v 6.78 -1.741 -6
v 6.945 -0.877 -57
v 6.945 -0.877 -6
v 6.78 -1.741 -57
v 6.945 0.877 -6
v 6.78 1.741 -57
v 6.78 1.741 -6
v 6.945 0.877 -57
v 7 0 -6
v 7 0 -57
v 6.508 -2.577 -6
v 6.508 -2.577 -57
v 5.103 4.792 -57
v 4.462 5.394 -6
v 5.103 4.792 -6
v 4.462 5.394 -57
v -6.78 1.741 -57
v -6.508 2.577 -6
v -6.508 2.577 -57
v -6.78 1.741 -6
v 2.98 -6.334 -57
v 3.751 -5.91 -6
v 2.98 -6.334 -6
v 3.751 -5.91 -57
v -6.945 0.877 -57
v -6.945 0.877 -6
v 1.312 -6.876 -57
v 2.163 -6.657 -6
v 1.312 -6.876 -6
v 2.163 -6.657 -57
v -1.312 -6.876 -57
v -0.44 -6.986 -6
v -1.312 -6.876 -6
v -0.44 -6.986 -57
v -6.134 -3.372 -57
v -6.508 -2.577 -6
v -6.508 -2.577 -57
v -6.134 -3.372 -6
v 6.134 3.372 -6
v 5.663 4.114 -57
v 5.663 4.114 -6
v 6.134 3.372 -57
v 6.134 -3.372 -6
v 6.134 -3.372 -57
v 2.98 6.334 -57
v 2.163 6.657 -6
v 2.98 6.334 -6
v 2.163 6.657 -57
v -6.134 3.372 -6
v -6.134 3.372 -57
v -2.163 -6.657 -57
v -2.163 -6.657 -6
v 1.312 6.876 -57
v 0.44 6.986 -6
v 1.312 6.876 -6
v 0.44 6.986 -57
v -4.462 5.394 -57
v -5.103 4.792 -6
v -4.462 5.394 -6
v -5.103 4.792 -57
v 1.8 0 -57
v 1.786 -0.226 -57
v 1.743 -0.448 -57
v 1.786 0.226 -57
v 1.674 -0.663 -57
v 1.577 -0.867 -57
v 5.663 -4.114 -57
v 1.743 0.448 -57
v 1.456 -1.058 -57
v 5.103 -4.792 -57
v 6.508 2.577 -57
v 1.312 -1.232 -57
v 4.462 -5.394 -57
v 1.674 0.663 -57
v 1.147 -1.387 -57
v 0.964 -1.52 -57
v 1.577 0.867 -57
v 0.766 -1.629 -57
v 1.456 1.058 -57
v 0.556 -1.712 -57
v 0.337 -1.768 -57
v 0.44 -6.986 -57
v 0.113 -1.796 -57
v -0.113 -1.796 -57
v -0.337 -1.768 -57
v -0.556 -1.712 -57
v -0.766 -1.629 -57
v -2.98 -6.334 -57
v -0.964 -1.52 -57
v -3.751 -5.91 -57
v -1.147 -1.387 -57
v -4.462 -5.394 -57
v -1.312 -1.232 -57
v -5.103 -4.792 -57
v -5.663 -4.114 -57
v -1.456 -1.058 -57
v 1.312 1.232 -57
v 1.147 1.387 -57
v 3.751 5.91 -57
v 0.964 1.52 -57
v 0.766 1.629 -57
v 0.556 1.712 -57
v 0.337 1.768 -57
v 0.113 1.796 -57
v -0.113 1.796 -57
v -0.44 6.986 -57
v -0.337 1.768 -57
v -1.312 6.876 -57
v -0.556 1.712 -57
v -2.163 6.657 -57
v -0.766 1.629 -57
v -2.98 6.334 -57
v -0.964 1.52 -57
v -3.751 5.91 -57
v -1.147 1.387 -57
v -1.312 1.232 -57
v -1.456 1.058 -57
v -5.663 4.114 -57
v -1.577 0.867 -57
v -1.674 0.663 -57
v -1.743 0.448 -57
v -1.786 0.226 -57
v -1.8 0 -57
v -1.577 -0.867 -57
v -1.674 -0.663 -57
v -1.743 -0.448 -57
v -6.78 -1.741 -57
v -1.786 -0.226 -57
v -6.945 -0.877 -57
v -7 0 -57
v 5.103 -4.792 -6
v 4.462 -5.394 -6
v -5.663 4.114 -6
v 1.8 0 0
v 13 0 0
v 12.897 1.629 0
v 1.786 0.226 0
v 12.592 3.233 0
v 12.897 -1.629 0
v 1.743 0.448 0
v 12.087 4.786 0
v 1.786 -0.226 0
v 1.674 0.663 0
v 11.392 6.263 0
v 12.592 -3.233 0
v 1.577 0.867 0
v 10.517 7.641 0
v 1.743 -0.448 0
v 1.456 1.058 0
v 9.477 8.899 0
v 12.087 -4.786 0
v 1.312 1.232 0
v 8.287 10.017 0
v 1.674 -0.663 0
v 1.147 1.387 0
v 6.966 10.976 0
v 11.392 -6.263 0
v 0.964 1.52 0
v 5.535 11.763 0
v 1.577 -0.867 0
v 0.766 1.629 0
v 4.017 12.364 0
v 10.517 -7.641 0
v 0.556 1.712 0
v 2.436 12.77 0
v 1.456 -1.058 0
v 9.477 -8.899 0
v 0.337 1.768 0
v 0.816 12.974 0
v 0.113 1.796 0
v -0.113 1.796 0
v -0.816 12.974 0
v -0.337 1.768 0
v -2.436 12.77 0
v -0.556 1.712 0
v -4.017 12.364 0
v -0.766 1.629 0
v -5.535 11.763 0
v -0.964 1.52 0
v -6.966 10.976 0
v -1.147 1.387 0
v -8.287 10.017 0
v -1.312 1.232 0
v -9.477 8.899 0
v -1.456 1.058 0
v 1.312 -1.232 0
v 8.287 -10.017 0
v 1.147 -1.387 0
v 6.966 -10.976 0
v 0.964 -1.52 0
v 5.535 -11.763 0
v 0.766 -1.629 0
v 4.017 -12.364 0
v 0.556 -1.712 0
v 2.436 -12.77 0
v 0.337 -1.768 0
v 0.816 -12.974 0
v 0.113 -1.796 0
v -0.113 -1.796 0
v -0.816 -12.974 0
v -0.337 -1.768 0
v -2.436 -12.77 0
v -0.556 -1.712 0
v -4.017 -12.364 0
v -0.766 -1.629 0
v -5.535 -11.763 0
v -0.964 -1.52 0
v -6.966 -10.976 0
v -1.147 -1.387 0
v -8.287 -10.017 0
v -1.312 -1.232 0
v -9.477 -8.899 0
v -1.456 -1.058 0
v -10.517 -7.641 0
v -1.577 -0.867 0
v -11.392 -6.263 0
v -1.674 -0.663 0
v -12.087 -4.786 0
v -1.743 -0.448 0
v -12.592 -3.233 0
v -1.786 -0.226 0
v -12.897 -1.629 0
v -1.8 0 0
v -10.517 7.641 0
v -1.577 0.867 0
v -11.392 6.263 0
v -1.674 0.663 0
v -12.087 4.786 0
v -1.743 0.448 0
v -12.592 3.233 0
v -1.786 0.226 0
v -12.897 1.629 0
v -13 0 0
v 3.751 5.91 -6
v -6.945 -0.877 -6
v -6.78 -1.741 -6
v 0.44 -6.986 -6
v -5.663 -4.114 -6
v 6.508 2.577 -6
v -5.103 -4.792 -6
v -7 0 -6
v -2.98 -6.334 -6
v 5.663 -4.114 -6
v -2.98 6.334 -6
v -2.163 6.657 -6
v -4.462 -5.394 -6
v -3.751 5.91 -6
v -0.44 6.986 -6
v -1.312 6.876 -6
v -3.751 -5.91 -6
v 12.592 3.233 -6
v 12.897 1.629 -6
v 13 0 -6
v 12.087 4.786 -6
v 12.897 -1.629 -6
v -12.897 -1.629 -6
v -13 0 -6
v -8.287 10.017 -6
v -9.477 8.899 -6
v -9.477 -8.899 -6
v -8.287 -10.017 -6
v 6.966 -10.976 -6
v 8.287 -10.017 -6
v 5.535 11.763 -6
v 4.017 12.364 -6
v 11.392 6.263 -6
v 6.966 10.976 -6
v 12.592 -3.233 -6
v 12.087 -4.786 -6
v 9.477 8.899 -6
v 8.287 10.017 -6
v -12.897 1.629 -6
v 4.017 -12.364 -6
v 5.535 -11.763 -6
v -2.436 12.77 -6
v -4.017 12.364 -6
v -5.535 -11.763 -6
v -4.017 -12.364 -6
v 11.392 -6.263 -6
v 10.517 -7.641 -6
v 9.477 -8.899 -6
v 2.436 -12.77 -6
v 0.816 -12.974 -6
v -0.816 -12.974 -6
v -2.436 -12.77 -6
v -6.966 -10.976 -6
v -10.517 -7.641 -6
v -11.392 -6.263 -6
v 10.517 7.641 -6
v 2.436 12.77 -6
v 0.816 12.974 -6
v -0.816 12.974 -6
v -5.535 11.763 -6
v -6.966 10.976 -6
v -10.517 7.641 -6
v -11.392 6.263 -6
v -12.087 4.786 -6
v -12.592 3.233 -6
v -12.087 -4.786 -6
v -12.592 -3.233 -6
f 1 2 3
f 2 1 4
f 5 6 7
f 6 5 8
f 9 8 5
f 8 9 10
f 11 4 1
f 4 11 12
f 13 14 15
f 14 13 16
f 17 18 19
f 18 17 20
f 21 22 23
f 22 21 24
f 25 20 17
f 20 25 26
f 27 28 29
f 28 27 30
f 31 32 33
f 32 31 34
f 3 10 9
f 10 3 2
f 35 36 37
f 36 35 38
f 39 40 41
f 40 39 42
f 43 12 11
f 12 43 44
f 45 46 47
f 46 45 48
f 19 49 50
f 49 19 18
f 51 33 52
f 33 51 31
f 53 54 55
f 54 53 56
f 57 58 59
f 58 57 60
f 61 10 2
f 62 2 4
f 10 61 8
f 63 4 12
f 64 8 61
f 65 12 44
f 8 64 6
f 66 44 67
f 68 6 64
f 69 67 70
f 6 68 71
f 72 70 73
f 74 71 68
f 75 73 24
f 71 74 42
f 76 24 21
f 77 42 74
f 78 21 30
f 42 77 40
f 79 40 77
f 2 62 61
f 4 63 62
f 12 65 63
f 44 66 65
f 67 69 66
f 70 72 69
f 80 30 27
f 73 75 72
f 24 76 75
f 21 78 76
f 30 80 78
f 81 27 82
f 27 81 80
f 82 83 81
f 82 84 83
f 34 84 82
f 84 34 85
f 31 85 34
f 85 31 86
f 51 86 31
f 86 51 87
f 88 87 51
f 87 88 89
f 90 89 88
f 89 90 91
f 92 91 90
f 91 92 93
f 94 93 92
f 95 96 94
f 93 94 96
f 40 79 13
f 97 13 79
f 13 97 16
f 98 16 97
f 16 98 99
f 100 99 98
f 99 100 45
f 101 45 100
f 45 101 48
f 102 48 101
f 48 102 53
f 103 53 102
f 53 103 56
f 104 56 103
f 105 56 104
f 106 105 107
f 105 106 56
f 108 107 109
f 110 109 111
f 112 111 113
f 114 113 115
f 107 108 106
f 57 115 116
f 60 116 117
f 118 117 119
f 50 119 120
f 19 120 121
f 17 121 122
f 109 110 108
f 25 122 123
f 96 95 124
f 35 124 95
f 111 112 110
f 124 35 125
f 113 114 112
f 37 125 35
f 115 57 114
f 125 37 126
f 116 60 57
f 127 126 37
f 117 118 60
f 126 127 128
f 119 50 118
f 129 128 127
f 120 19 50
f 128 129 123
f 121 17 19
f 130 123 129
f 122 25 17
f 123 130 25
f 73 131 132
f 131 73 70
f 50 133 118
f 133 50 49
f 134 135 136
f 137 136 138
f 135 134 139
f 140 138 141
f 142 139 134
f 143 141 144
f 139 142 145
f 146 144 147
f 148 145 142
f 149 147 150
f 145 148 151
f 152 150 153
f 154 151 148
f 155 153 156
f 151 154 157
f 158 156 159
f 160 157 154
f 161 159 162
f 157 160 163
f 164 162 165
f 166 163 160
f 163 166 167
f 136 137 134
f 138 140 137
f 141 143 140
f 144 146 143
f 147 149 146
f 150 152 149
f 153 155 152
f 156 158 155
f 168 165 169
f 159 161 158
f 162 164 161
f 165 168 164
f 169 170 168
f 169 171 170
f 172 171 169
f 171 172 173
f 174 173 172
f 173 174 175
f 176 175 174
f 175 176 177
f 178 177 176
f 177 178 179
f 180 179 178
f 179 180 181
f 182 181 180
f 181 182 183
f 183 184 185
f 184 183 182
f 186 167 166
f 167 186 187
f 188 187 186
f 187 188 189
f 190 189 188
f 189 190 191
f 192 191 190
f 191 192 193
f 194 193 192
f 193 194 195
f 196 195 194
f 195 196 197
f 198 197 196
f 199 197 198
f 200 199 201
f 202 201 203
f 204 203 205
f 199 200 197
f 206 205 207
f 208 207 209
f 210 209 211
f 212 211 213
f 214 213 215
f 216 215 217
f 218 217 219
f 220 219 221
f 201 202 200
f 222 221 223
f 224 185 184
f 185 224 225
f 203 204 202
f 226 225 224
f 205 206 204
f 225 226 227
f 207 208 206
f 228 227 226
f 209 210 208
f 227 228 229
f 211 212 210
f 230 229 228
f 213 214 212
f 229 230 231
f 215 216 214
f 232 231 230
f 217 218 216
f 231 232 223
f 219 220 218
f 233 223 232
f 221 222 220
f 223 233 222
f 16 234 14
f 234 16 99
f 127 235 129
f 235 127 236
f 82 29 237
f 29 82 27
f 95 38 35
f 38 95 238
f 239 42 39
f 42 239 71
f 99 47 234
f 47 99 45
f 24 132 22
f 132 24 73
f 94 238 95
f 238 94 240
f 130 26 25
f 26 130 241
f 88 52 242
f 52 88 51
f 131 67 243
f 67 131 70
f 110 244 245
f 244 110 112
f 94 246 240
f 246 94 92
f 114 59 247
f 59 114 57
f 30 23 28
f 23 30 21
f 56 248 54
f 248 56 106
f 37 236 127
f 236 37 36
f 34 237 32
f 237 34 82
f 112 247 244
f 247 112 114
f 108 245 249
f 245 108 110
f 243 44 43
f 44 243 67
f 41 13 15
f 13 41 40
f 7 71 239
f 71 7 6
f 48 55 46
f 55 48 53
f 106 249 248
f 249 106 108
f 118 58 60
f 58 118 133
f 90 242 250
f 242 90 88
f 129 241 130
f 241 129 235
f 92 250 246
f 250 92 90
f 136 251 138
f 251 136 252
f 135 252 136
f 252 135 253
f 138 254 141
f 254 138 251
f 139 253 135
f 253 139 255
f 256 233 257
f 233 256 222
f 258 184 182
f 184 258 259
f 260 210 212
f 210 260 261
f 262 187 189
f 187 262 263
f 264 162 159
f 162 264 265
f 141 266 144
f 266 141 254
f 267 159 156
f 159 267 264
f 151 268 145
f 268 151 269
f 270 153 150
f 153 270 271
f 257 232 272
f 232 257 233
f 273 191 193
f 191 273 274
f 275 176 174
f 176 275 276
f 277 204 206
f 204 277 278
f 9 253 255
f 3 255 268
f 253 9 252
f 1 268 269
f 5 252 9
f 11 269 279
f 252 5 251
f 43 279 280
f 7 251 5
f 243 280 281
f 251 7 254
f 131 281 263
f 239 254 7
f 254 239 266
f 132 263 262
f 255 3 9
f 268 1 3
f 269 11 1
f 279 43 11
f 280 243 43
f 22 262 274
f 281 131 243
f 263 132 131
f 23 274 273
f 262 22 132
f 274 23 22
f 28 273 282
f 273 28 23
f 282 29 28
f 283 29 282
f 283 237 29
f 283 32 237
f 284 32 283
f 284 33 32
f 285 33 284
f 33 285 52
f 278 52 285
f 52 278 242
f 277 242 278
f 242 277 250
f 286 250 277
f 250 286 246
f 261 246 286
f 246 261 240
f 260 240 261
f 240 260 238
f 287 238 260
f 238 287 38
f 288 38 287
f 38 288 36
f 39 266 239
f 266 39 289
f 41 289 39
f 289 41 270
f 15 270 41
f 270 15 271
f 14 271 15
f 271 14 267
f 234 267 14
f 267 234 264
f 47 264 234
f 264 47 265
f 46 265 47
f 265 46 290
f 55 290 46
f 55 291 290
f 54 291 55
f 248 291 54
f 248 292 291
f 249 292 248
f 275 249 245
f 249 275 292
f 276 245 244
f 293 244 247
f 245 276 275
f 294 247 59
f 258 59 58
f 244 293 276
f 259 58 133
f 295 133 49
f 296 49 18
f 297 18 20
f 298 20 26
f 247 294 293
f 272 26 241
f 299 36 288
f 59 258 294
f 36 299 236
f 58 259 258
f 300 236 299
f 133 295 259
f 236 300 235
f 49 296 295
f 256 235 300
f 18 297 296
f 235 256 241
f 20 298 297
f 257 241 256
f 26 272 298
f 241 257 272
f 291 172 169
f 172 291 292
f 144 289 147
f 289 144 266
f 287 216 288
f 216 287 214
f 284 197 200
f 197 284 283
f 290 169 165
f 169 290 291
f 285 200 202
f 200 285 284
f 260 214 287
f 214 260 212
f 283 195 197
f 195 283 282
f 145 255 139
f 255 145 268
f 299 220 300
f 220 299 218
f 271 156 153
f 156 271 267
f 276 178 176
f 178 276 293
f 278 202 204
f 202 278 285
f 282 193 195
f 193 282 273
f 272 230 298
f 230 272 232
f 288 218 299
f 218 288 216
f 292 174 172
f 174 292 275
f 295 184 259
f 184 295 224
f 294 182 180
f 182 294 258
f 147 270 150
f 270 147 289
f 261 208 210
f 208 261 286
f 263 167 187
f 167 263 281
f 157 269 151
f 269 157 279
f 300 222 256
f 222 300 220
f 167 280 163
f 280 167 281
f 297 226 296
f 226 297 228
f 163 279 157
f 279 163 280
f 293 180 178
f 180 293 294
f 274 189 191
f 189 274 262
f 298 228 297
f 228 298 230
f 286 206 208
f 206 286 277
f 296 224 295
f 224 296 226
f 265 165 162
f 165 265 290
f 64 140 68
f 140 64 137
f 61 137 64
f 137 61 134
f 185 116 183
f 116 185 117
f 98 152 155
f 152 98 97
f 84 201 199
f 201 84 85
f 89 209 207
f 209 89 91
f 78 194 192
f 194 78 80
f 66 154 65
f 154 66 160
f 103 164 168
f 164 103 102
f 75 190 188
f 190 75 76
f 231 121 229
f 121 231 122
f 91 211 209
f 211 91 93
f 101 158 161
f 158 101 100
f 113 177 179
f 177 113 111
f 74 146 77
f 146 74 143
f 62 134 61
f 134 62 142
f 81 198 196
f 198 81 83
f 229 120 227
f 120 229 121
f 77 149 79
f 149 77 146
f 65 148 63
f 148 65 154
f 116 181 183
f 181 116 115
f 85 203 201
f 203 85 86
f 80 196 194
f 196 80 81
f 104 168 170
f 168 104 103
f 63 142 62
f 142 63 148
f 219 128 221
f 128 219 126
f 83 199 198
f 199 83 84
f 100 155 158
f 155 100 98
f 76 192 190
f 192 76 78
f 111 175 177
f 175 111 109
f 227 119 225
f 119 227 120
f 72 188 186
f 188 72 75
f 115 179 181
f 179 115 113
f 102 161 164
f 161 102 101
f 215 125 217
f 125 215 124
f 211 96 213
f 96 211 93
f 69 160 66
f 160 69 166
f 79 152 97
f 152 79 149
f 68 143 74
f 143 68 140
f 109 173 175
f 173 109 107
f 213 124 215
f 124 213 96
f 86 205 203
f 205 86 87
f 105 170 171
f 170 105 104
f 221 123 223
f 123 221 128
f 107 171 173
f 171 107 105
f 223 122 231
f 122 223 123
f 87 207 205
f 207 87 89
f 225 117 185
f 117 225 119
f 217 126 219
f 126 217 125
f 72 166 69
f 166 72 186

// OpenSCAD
$fn = 50;


difference() {
	union() {
		translate(v = [0, 0, -57.0000000000]) {
			cylinder(h = 57, r = 7.0000000000);
		}
		translate(v = [0, 0, -6.0000000000]) {
			cylinder(h = 6, r = 13.0000000000);
		}
	}
	union() {
		#translate(v = [0, 0, -57]) {
			cylinder(h = 57, r = 1.8000000000);
		}
	}
}
